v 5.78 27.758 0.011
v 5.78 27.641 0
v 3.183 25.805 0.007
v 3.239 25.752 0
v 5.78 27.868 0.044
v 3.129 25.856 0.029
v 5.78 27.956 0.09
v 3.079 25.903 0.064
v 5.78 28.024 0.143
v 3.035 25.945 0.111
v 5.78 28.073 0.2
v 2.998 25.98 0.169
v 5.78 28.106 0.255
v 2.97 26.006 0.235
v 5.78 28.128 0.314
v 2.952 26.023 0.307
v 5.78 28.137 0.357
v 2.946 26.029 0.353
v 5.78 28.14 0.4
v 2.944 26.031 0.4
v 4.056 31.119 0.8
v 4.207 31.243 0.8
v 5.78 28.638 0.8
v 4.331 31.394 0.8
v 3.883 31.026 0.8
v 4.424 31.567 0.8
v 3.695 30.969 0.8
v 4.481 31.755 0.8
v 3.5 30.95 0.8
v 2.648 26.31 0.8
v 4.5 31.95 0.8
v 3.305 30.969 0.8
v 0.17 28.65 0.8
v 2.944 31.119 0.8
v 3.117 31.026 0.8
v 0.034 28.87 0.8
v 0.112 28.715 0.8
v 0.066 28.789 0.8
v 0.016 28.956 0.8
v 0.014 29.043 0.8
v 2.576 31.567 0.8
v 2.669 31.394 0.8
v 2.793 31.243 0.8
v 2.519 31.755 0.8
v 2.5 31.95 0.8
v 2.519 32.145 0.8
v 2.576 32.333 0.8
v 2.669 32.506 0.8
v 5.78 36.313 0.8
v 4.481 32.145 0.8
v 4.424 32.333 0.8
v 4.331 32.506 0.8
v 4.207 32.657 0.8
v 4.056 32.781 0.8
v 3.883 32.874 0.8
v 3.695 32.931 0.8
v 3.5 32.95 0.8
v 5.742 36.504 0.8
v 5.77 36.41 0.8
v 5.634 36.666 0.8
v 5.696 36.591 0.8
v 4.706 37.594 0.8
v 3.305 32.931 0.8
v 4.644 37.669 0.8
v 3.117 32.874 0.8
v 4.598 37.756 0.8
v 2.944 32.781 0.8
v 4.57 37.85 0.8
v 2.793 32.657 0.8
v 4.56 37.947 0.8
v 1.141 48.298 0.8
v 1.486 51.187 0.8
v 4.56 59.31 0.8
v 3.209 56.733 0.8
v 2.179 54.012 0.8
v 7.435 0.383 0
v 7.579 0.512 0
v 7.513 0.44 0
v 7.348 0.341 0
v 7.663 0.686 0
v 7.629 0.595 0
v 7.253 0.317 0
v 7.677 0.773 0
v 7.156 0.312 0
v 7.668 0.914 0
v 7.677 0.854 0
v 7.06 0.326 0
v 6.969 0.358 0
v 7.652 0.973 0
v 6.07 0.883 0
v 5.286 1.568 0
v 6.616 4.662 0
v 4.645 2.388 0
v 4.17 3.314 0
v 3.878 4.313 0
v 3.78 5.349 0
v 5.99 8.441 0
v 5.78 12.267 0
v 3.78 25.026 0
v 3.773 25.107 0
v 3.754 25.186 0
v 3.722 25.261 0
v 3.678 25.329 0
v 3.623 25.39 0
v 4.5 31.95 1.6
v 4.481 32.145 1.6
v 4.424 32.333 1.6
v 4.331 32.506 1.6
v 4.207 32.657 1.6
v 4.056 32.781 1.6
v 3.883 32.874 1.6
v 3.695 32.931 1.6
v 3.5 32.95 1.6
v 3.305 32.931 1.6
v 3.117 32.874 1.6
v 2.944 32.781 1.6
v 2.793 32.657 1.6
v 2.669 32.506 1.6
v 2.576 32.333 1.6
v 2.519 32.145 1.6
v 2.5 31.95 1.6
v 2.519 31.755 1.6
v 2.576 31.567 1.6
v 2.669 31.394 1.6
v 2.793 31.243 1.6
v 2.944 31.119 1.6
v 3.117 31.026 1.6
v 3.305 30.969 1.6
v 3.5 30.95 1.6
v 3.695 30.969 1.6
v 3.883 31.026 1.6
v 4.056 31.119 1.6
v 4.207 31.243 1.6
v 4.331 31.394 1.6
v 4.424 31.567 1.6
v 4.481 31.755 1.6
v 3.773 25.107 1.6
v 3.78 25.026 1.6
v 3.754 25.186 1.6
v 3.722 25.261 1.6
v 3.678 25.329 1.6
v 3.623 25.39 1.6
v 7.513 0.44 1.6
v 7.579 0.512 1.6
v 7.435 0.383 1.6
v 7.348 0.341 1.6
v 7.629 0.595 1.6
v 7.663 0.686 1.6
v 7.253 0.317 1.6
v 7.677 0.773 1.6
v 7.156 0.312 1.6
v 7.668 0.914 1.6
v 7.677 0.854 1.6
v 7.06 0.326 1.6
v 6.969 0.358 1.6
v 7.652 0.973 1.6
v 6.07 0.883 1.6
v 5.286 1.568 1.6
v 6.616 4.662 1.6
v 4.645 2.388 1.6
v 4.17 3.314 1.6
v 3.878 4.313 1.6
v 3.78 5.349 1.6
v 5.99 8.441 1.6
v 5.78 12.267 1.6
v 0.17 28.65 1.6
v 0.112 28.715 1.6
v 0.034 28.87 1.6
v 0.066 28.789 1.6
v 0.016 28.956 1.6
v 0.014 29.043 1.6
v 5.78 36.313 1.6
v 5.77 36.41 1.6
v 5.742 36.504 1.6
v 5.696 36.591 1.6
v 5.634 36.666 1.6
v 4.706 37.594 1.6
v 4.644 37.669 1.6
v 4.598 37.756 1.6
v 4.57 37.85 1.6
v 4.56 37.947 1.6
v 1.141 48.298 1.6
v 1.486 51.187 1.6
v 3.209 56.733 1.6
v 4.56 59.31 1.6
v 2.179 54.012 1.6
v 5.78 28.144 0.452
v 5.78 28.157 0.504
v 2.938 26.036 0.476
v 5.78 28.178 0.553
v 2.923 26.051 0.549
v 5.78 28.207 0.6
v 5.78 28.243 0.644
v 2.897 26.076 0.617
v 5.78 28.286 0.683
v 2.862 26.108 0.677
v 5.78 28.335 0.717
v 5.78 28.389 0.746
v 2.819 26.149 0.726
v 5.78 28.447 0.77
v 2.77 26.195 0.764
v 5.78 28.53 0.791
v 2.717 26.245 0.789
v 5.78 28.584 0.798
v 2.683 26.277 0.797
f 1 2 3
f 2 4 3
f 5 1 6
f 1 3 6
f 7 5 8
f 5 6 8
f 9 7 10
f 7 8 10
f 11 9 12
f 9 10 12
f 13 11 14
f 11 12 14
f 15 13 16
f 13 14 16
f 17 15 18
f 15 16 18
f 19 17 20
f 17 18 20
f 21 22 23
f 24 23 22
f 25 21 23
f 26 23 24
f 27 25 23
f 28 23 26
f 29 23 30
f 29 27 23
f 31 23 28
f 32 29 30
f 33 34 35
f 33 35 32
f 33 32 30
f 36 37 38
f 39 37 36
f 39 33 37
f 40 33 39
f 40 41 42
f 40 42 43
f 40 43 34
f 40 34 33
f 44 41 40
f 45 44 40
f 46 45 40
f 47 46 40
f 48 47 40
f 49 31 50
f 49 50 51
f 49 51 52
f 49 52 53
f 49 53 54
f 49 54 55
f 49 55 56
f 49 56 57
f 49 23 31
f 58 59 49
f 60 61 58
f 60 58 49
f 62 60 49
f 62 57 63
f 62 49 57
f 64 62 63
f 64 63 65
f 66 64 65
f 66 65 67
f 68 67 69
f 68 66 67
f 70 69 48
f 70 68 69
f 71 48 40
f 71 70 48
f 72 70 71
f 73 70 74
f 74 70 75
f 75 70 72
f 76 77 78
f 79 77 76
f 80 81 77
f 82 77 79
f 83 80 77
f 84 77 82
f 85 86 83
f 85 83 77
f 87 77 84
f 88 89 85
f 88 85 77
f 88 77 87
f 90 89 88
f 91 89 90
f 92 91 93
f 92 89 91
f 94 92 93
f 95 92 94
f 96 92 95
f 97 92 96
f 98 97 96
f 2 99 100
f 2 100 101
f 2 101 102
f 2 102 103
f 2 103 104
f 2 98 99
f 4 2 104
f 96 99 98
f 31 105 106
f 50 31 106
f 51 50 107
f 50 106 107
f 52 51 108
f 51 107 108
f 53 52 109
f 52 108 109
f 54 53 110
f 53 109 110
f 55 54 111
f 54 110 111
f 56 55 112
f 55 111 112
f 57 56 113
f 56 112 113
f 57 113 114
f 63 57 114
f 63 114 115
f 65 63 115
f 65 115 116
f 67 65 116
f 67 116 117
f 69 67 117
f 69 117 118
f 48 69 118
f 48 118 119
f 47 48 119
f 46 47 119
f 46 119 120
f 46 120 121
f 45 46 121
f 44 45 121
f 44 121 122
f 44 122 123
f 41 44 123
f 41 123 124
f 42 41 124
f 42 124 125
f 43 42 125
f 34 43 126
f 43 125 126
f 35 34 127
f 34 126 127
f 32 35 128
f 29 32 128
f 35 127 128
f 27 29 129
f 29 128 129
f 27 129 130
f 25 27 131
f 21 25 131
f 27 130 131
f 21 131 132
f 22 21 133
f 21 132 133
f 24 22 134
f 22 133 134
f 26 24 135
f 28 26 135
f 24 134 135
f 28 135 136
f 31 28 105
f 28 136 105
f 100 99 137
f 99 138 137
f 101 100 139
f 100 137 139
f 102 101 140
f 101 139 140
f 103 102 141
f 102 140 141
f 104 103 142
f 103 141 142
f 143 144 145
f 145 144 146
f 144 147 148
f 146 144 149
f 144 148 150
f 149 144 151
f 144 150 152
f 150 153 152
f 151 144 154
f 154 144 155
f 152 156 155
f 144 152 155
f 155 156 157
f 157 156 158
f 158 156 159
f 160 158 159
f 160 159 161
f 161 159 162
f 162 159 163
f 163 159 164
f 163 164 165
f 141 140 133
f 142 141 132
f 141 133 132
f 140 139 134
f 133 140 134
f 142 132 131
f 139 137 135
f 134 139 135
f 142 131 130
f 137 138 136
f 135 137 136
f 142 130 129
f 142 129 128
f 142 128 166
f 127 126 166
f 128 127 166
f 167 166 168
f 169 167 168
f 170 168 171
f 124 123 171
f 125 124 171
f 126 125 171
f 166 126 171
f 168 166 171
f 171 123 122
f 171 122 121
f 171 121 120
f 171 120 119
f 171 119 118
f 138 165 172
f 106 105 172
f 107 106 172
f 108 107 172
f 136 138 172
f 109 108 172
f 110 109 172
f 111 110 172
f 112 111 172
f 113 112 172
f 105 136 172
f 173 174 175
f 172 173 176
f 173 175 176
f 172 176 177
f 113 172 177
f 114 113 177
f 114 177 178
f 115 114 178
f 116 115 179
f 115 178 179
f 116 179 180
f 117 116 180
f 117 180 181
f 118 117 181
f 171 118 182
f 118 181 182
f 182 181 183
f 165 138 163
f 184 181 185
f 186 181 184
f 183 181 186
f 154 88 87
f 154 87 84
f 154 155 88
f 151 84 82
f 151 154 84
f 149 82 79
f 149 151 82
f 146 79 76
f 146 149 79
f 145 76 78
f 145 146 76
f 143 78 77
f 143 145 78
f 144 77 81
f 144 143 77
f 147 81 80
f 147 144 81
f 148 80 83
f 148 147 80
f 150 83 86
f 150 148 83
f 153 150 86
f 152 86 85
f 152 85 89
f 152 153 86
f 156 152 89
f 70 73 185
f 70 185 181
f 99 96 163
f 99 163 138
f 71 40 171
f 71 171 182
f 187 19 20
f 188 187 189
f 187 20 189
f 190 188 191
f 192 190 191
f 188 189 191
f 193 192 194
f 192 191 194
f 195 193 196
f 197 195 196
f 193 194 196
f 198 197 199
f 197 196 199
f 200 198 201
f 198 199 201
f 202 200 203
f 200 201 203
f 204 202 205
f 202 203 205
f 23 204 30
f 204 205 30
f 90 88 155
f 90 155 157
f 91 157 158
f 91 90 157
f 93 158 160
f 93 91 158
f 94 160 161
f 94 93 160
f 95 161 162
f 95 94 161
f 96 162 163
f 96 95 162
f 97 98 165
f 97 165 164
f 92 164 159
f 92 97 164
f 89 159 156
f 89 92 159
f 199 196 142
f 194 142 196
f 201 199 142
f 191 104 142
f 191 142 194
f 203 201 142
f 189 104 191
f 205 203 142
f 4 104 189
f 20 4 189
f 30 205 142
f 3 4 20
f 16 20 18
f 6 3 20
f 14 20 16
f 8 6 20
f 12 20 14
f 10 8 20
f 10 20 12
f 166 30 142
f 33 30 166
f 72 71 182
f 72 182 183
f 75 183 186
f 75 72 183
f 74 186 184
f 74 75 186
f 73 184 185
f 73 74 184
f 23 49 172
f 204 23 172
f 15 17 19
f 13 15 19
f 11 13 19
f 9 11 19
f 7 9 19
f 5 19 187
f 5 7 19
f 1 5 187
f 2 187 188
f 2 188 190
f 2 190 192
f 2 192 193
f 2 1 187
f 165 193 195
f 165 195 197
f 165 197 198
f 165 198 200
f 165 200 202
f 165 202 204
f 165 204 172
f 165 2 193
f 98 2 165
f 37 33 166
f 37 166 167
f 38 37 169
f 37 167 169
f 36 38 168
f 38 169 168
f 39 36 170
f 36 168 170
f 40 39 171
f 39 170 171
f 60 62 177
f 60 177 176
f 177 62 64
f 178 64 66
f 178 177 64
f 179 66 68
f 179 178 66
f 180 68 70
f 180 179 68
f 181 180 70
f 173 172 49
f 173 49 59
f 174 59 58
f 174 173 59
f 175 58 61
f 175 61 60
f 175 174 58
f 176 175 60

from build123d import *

# Parameters (mm, degrees)
BOSS_EXTRUDE1_DEPTH = 1.6
SKETCH2_R           = 1
CUT_EXTRUDE1_DEPTH  = 60.868490043
FILLET1_R           = 0.5
CUT_EXTRUDE3_DEPTH  = 0.8
FILLET2_R           = 0.4


with BuildPart() as part:
    # Sketch1 → Boss-Extrude1 (new body)
    with BuildSketch(Plane.XY):
        with BuildLine():
            Line((3.78, 5.348981211), (3.78, 25.241675085))
            Line((3.78, 25.241675085), (0, 28.81))
            Line((0, 28.81), (1.140731522, 48.297942259))
            ThreePointArc((1.140731522, 48.297942259), (2.179202609, 54.012368785), (4.56, 59.31))
            Line((4.56, 59.31), (4.56, 37.74))
            Line((4.56, 37.74), (5.78, 36.52))
            Line((5.78, 36.52), (5.78, 12.266686594))
            ThreePointArc((5.78, 12.266686594), (6.339471549, 6.033709777), (8, 0))
            ThreePointArc((8, 0), (4.962014359, 1.942369992), (3.78, 5.348981211))
        make_face()
    extrude(amount=BOSS_EXTRUDE1_DEPTH)

    # Sketch2 → Cut-Extrude1 (cut, through all)
    with BuildSketch(Plane.XY.offset(1.6)):
        with Locations((3.5, 31.95)):
            Circle(SKETCH2_R)
    extrude(amount=-CUT_EXTRUDE1_DEPTH, mode=Mode.SUBTRACT)

    # Fillet1
    fillet1_edges = [part.edges().sort_by_distance(p)[0] for p in [
        (3.78, 25.241675085, 0.8),
        (0, 28.81, 0.8),
        (4.56, 37.74, 0.8),
        (5.78, 36.52, 0.8),
        (8, 0, 0.8),
    ]]
    fillet(fillet1_edges, radius=FILLET1_R)

    # Sketch8 → Cut-Extrude3 (cut)
    with BuildSketch(Plane(origin=(0, 0, 0), x_dir=(-1, 0, 0), z_dir=(0, 0, -1))):
        Polygon((-2.943771792, 26.031075601), (11.550433579, 26.031075601), (11.550433579, 65.314635105), (-14.375020628, 65.314635105), (-14.375020628, 34.529960463), align=None)
    extrude(amount=-CUT_EXTRUDE3_DEPTH, mode=Mode.SUBTRACT)

    # Fillet2
    fillet2_edges = [part.edges().sort_by_distance(p)[0] for p in [
        (4.361885896, 27.085412591, 0.8),
        (4.361885896, 27.085412591, 0),
    ]]
    fillet(fillet2_edges, radius=FILLET2_R - 0.0001)  # a hair under: the kernel refuses the full size


solid = part.part
